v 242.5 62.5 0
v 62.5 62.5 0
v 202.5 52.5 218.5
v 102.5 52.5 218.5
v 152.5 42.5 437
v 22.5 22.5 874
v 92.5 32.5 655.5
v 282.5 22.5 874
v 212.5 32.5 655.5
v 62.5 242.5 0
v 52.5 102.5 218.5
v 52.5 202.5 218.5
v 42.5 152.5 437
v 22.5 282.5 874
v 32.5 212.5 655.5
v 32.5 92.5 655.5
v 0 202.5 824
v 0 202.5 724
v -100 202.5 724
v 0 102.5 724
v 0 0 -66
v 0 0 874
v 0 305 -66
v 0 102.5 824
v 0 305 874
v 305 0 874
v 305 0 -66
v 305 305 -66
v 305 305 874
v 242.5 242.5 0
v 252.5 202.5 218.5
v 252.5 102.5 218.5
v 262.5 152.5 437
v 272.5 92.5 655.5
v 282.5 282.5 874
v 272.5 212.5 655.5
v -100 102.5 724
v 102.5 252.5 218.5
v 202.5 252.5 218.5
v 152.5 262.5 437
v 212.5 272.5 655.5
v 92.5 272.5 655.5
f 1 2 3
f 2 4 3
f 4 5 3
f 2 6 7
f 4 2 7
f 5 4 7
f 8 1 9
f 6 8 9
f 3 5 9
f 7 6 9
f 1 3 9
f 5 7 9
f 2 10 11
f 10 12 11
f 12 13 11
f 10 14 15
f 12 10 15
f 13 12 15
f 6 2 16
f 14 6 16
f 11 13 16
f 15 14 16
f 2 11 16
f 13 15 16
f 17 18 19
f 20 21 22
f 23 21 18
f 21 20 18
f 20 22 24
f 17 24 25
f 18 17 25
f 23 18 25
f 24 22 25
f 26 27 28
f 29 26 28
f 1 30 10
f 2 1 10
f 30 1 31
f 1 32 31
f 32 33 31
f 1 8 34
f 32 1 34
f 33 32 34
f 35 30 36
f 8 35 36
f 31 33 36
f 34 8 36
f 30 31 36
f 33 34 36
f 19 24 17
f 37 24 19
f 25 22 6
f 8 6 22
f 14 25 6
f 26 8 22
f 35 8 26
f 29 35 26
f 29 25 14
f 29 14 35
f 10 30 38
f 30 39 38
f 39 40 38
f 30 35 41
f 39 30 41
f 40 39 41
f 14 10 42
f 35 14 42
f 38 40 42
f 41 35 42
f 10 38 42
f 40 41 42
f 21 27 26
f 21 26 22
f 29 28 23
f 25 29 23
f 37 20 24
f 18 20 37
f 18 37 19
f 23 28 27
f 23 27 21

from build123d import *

# Parameters (mm, degrees)
SKETCH1_W           = 305
SKETCH1_H           = 305
BOSS_EXTRUDE2_DEPTH = 874
SKETCH3_W           = 100
SKETCH3_H           = 100
BOSS_EXTRUDE4_DEPTH = 100
CUT_EXTRUDE3_DEPTH  = 100
SKETCH8_W           = 305
SKETCH8_H           = 305
BOSS_EXTRUDE5_DEPTH = 66


with BuildPart() as part:
    # Sketch1 → Boss-Extrude2 (new body)
    with BuildSketch(Plane.XY):
        with Locations((152.5, 152.5)):
            Rectangle(SKETCH1_W, SKETCH1_H)
    extrude(amount=BOSS_EXTRUDE2_DEPTH)

    # Sketch3 → Boss-Extrude4 (add)
    with BuildSketch(Plane.ZY):
        with Locations((774, 152.5)):
            Rectangle(SKETCH3_W, SKETCH3_H)
    extrude(amount=BOSS_EXTRUDE4_DEPTH)

    # Sketch5 → Cut-Extrude3 (cut)
    with BuildSketch(Plane.XZ.offset(-102.5)):
        Polygon((-100, 824), (0, 824), (-100, 724), align=None)
    extrude(amount=-CUT_EXTRUDE3_DEPTH, mode=Mode.SUBTRACT)

    # Sketch2 → Cut-Loft2 section 0
    with BuildSketch(Plane(origin=(0, 0, 0), x_dir=(-1, 0, 0), z_dir=(0, 0, -1))):
        with BuildLine():
            Line((-242.5, 242.5), (-62.5, 242.5))
            Line((-62.5, 242.5), (-62.5, 62.5))
            Line((-62.5, 62.5), (-242.5, 62.5))
            Line((-242.5, 62.5), (-242.5, 242.5))
        make_face()
    # Sketch6 → Cut-Loft2 section 1
    with BuildSketch(Plane.XY.offset(874)):
        with BuildLine():
            Line((22.5, 282.5), (282.5, 282.5))
            Line((282.5, 282.5), (282.5, 22.5))
            Line((282.5, 22.5), (22.5, 22.5))
            Line((22.5, 22.5), (22.5, 282.5))
        make_face()
    loft(mode=Mode.SUBTRACT)

    # Sketch8 → Boss-Extrude5 (add)
    with BuildSketch(Plane(origin=(0, 0, 0), x_dir=(-1, 0, 0), z_dir=(0, 0, -1))):
        with Locations((-152.5, 152.5)):
            Rectangle(SKETCH8_W, SKETCH8_H)
    extrude(amount=BOSS_EXTRUDE5_DEPTH)


solid = part.part
